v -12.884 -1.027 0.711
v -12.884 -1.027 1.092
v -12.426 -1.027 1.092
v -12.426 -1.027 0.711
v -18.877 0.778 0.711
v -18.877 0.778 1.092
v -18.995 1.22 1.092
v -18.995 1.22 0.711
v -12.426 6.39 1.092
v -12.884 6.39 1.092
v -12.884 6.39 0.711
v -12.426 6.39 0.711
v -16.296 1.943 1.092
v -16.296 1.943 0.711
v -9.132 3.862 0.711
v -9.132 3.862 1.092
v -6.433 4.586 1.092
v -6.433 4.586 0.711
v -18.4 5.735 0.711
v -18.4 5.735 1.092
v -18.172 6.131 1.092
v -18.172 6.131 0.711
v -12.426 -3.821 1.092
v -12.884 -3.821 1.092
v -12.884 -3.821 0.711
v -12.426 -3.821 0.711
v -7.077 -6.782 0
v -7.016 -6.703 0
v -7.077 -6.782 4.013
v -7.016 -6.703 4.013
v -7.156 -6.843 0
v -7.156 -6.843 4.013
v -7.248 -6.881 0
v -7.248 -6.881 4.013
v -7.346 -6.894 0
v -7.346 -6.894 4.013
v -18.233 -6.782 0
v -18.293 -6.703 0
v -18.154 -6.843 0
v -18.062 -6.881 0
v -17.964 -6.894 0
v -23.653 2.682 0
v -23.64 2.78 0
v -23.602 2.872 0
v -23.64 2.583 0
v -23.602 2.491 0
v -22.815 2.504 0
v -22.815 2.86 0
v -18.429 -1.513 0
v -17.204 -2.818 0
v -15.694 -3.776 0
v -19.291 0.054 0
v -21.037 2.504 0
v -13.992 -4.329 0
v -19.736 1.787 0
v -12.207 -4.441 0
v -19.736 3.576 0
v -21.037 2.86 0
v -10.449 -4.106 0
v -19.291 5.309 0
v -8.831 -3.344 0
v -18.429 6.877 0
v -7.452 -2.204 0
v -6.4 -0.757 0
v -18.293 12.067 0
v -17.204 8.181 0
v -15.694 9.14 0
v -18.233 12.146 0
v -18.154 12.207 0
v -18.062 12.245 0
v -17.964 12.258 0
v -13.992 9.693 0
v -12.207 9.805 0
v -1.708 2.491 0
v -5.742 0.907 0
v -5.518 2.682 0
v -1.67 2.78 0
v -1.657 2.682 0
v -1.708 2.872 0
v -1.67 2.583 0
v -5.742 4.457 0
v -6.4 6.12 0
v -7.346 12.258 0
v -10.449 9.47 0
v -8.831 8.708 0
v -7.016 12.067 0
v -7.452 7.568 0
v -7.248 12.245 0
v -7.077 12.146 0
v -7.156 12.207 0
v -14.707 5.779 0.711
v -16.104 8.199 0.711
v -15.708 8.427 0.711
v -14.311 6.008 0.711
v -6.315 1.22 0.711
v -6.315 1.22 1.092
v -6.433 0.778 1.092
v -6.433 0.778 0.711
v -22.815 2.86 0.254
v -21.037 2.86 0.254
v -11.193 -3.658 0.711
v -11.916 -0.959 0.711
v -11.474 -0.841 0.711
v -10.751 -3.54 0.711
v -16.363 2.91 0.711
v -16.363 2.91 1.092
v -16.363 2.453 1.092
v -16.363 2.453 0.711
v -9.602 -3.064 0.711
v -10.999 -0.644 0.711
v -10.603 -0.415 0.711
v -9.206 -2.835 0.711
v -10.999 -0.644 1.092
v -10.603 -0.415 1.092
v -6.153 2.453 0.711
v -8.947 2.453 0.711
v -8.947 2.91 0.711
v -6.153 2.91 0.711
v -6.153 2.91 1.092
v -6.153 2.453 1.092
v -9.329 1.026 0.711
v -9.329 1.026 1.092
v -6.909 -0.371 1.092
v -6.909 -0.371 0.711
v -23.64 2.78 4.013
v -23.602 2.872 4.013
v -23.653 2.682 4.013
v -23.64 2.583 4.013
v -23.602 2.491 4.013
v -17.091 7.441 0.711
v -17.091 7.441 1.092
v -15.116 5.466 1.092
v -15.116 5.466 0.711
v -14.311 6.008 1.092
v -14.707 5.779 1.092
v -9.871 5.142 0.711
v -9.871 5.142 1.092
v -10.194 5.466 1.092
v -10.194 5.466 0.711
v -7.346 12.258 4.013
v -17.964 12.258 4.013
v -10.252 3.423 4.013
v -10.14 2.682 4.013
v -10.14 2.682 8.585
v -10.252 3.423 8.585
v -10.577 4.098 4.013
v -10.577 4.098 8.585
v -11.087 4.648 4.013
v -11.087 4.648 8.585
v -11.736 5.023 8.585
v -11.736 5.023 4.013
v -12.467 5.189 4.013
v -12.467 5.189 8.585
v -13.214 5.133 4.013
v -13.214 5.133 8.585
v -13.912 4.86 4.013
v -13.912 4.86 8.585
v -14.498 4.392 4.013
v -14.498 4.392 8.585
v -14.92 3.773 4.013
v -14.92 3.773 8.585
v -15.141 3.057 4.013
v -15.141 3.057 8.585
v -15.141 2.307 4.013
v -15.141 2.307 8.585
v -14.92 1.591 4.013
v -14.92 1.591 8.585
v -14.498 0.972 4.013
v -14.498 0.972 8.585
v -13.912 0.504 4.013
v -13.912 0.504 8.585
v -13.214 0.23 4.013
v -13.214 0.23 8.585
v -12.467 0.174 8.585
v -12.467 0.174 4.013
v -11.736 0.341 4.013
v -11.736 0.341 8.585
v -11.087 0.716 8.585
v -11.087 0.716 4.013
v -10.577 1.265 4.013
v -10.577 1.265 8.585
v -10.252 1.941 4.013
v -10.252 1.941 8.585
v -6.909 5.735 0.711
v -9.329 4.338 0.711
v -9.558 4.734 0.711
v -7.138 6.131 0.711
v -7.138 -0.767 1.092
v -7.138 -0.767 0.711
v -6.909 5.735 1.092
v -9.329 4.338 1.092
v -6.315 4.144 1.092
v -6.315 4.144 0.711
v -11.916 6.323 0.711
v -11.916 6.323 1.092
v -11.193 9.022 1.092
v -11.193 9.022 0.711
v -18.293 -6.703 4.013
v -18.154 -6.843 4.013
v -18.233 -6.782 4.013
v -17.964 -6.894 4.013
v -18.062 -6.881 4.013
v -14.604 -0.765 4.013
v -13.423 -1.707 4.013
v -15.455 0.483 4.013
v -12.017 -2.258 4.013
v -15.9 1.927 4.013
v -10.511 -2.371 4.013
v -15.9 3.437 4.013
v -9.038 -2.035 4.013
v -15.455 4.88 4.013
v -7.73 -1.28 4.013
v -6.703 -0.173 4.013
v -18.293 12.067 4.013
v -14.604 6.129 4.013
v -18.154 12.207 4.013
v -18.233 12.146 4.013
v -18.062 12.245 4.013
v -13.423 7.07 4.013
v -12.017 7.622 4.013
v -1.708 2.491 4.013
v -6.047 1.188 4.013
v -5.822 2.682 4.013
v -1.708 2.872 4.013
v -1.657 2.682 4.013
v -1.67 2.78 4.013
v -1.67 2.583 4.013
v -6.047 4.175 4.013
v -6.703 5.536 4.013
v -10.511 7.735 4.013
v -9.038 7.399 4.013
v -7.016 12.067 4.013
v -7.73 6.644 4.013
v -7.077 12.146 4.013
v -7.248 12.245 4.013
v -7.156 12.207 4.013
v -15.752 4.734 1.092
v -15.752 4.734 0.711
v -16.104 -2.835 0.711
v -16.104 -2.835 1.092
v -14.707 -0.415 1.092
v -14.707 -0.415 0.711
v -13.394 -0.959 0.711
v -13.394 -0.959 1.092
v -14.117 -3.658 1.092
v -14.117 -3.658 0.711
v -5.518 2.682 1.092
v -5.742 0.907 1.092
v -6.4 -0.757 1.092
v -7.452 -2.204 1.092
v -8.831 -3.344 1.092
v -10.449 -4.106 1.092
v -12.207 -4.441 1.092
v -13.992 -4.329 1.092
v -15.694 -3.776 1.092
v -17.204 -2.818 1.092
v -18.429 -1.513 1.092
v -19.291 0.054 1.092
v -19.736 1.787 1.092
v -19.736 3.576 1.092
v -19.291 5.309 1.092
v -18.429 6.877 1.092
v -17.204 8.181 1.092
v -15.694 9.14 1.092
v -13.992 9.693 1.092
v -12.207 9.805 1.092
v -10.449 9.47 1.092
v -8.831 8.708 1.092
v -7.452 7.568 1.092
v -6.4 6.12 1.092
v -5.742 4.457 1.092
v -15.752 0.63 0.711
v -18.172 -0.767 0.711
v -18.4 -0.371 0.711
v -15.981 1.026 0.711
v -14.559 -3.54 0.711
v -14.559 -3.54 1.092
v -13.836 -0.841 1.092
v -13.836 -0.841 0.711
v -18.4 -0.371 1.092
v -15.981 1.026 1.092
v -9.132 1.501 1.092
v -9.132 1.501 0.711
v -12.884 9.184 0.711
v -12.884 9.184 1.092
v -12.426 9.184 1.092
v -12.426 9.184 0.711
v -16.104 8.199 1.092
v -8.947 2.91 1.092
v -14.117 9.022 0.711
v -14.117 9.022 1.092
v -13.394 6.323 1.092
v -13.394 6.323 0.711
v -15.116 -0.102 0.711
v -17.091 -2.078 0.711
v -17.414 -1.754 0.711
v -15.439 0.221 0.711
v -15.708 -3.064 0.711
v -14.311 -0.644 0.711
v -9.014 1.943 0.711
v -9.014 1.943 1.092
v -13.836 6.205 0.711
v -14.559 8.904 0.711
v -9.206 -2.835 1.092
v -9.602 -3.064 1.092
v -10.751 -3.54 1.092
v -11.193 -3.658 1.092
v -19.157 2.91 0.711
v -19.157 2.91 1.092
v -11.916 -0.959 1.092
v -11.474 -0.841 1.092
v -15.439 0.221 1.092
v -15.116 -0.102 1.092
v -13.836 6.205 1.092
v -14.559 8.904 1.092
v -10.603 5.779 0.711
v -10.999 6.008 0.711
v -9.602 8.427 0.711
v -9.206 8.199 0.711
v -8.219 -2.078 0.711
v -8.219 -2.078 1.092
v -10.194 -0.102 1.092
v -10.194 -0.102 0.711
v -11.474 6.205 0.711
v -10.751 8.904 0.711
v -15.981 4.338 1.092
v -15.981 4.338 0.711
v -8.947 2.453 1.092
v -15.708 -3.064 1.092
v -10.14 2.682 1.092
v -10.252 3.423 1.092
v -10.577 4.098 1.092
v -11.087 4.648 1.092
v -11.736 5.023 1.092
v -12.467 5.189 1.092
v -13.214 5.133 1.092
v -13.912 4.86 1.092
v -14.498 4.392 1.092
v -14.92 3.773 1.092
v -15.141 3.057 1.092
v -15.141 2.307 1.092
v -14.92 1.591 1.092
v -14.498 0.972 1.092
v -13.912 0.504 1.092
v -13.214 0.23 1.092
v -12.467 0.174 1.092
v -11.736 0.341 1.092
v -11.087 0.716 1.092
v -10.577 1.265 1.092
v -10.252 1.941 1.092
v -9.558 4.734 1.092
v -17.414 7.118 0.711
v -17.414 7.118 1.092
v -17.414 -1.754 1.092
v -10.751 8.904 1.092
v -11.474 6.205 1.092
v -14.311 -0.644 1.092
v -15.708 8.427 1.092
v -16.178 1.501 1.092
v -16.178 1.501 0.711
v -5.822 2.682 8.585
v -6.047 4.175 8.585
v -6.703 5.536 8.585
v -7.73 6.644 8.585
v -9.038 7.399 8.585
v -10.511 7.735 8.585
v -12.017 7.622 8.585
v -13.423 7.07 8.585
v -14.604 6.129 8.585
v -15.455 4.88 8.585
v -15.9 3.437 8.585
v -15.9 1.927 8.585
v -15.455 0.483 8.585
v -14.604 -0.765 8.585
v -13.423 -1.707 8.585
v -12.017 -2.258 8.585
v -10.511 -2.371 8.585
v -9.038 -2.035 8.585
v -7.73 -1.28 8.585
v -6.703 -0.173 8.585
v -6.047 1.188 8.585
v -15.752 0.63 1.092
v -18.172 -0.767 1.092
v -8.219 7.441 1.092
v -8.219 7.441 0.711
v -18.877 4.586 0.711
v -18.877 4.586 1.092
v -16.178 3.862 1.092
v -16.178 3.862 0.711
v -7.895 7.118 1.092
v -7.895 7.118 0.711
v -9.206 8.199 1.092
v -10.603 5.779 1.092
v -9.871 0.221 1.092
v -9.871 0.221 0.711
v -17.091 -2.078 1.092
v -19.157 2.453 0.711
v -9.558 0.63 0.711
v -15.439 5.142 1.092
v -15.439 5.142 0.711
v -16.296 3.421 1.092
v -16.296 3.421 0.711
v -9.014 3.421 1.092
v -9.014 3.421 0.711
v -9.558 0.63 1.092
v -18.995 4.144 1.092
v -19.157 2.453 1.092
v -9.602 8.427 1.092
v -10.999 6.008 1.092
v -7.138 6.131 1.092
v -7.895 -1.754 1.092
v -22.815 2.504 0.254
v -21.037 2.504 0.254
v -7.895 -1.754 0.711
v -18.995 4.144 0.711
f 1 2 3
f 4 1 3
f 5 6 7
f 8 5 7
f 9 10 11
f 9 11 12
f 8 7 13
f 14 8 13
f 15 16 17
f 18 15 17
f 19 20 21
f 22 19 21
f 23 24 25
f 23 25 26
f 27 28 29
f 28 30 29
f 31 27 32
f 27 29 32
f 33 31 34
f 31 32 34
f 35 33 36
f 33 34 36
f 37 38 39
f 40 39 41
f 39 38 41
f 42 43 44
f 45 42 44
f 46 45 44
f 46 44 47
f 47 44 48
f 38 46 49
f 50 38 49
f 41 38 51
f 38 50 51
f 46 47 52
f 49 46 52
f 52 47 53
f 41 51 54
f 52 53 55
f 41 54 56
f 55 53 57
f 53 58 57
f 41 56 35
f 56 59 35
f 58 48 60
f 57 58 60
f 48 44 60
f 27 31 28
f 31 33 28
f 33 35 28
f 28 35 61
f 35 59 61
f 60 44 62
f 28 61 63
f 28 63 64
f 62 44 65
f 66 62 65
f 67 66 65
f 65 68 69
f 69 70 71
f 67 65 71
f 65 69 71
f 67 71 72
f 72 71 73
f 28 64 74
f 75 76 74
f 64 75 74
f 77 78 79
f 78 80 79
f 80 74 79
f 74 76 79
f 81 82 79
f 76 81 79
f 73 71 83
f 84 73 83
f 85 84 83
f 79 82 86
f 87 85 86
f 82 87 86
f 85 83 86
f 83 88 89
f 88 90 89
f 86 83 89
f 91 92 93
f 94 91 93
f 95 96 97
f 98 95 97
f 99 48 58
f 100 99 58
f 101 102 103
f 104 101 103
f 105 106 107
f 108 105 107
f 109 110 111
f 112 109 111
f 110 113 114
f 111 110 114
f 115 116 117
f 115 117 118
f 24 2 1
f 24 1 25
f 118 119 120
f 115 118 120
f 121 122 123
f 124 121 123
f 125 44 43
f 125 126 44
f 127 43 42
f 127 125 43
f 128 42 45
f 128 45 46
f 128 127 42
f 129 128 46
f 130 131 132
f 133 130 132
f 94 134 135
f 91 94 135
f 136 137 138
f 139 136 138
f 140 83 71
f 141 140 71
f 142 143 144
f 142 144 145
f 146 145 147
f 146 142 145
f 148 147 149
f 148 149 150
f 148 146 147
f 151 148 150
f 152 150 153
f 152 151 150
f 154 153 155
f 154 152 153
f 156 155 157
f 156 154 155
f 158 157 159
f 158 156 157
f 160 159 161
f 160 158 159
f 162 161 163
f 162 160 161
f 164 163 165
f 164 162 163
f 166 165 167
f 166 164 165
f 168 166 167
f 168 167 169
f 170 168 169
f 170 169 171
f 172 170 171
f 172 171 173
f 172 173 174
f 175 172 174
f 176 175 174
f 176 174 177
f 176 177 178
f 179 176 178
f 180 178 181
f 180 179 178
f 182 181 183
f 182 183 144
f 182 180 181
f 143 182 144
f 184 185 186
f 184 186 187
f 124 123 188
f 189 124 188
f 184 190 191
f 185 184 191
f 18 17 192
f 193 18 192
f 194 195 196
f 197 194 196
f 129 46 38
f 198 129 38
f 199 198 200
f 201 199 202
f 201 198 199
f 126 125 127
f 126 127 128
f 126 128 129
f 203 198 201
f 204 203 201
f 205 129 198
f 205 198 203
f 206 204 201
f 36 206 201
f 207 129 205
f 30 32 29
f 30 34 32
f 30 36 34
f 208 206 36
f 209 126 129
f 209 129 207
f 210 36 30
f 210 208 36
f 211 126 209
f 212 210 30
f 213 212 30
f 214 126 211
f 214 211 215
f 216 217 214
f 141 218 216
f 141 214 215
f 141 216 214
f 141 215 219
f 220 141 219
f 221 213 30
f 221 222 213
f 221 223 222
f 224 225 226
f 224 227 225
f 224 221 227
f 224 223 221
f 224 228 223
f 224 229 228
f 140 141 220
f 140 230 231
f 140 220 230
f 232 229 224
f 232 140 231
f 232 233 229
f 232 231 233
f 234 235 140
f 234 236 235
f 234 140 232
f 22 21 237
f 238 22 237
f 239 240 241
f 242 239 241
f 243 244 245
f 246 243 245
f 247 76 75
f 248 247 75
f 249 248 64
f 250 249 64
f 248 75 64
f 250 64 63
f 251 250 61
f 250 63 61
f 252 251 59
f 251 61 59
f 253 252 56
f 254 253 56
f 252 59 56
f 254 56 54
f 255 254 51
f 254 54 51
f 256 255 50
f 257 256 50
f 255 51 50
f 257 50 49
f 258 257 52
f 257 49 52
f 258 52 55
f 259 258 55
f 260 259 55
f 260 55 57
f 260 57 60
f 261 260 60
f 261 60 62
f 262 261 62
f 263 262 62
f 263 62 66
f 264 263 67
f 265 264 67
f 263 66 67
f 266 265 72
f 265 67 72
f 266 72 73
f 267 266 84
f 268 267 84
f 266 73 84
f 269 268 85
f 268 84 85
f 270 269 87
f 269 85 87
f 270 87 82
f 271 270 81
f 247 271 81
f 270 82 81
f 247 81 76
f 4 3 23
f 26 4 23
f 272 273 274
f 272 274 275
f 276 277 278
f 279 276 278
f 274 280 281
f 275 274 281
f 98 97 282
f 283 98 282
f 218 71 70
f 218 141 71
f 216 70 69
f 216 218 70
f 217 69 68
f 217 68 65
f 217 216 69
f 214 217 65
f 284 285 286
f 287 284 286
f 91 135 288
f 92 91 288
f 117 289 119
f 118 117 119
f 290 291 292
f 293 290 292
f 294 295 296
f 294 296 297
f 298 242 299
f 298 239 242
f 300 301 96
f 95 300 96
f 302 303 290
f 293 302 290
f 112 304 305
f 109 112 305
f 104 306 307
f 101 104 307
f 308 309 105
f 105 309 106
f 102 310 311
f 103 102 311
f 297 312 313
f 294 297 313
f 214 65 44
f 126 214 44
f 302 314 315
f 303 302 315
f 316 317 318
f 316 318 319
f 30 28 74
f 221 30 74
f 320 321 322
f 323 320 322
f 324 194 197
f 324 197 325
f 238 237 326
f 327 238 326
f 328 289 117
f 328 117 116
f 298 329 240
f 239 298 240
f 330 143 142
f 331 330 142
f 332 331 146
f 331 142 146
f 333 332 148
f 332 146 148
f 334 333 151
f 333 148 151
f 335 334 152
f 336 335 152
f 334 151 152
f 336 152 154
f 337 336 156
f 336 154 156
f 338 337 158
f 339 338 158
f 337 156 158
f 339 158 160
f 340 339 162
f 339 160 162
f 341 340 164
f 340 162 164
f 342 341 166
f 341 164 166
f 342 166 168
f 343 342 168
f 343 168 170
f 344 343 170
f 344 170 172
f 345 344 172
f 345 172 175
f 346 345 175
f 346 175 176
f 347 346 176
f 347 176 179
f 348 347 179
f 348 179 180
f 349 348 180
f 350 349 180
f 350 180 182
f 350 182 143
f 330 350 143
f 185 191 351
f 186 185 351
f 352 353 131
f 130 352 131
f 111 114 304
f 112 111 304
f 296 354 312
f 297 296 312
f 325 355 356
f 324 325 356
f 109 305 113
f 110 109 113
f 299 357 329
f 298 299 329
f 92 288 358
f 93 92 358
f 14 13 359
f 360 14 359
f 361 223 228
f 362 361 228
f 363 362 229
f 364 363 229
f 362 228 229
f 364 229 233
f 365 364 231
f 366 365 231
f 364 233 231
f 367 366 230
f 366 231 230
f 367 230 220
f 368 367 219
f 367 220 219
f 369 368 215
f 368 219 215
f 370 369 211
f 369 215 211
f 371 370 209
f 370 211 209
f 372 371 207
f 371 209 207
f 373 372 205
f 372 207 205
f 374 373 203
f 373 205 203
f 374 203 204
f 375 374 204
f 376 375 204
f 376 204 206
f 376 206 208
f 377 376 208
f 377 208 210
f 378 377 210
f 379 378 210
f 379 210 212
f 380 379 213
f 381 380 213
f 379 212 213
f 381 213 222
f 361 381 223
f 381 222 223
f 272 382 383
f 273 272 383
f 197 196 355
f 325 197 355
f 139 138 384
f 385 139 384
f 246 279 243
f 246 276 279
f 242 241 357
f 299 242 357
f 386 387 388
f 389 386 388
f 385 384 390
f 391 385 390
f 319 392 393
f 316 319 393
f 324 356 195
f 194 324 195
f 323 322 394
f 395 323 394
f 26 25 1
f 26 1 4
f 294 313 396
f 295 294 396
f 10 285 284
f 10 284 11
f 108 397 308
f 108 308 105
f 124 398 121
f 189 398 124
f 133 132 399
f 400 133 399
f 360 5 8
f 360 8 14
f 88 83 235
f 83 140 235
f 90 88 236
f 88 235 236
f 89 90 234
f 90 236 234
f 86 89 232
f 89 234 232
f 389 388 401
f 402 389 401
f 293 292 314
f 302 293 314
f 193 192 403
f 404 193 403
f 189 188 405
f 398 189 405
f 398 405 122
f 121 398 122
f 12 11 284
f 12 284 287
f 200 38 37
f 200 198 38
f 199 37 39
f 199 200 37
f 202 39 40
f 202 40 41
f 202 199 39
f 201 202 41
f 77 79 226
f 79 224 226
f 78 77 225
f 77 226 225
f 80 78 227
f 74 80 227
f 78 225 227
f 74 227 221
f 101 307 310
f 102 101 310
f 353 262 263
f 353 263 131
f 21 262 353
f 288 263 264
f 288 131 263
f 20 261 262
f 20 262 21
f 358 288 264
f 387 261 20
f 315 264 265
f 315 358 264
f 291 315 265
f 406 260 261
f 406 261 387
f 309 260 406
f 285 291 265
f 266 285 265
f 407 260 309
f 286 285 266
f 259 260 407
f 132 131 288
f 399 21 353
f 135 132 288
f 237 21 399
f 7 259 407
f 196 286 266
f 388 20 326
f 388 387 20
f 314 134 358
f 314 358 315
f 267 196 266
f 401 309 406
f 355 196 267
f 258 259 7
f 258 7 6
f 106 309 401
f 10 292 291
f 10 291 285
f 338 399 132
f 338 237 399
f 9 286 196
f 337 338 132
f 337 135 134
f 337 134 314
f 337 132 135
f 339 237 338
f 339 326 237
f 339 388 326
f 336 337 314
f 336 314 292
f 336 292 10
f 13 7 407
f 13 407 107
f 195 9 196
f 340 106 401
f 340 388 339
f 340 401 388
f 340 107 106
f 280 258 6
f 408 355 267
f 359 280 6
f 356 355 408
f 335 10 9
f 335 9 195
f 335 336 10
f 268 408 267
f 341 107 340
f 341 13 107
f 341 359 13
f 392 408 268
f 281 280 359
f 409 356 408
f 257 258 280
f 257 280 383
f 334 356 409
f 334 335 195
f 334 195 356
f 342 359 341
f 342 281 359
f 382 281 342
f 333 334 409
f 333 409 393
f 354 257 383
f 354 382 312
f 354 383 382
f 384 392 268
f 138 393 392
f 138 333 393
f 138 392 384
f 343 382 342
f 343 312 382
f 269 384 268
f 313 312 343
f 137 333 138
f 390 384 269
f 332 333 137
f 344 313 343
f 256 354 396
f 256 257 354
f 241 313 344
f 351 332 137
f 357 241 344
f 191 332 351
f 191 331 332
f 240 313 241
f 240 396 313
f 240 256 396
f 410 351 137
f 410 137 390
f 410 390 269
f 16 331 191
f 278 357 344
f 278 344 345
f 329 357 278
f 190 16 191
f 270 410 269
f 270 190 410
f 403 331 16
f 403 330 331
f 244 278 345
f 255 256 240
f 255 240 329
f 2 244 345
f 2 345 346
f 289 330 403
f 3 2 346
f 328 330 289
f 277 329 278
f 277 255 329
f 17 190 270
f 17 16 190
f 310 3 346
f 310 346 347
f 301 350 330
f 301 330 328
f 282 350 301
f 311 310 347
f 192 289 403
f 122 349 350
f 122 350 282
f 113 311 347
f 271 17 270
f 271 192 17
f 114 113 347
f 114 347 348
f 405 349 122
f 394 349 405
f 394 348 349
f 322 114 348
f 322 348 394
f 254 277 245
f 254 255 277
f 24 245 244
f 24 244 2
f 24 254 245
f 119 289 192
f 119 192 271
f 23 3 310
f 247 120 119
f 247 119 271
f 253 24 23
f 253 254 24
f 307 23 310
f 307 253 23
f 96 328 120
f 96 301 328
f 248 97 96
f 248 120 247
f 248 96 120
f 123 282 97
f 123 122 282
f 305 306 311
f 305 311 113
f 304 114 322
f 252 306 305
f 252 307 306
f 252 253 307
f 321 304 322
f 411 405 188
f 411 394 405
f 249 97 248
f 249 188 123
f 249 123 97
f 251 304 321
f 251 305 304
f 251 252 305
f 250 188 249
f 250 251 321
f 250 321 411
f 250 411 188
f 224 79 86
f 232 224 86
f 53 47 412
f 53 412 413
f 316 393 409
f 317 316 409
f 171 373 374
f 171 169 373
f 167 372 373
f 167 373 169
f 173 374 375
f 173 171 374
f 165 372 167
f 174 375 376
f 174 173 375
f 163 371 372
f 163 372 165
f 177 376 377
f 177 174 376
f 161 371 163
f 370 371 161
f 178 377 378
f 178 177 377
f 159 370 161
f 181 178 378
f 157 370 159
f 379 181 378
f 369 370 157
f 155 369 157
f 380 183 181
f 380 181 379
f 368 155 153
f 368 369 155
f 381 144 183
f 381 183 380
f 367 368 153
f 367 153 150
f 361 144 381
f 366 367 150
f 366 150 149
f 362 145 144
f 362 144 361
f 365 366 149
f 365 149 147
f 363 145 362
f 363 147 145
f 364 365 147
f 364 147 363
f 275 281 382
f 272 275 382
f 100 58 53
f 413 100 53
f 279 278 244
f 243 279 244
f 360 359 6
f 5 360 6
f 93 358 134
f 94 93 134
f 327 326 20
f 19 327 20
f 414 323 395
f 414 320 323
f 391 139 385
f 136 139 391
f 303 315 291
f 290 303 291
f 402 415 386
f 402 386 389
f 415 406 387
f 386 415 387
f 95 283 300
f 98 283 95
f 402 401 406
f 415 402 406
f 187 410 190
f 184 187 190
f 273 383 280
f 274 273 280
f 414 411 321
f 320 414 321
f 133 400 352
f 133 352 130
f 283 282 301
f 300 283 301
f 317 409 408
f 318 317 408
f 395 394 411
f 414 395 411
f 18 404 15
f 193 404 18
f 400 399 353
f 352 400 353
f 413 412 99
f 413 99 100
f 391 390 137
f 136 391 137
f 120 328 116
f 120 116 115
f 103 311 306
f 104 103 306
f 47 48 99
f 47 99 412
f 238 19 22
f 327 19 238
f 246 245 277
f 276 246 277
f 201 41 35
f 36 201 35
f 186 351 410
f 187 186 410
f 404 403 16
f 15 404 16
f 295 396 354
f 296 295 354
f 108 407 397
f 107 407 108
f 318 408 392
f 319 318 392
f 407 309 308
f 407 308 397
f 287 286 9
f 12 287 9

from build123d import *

# Parameters (mm, degrees)
F1_DEPTH  = 4.0132
F2_R      = 2.5146
F3_DEPTH  = 25.4
F4_R      = 5.0673
F4_R_2    = 2.5146
F5_DEPTH  = 4.572
F6_R      = 7.1374
F7_DEPTH  = 1.0922
F8_W      = 2.794
F8_H      = 0.4572
F8_W_2    = 0.4572
F8_H_2    = 2.794
F9_DEPTH  = 0.381
F10_R     = 0.381
F11_W     = 1.778
F11_H     = 0.3556
F12_DEPTH = 0.254


with BuildPart() as f1:
    # F0 (on Top) → F1 (new body)
    with BuildSketch(Plane.XY):
        Polygon((-7.126325, 12.257675), (-18.183506, 12.257675), (-23.712097, 2.681875), (-18.183506, -6.893925), (-7.126325, -6.893925), (-1.597734, 2.681875), align=None)
    extrude(amount=F1_DEPTH)

    # F2 (on face) → F3 (cut)
    with BuildSketch(Plane.XY.offset(4.0132)):
        with Locations((-12.654915, 2.681875)):
            Circle(F2_R)
    extrude(amount=-F3_DEPTH, mode=Mode.SUBTRACT)

    # F4 (on face) → F5 (join)
    with BuildSketch(Plane.XY.offset(4.0132)):
        with Locations((-10.889615, 2.681875)):
            Circle(F4_R)
        with Locations((-12.654915, 2.681875)):
            Circle(F4_R_2, mode=Mode.SUBTRACT)
    extrude(amount=F5_DEPTH)

    # F6 (on face) → F7 (cut)
    with BuildSketch(Plane(origin=(0, 0, 0), x_dir=(1, 0, 0), z_dir=(0, 0, -1))):
        with Locations((-12.654915, -2.681875)):
            Circle(F6_R)
    extrude(amount=-F7_DEPTH, mode=Mode.SUBTRACT)

    # F8 (on face) → F9 (join)
    with BuildSketch(Plane(origin=(0, 0, 1.0922), x_dir=(1, 0, 0), z_dir=(0, 0, -1))):
        with Locations((-7.549515, -2.681875)):
            Rectangle(F8_W, F8_H)
        Polygon((-9.132042, -1.50126), (-9.01371, -1.942881), (-6.314913, -1.21974), (-6.433245, -0.778119), align=None)
        Polygon((-9.557647, -0.629701), (-9.329047, -1.025648), (-6.909372, 0.371352), (-7.137972, 0.767299), align=None)
        Polygon((-10.194325, 0.102005), (-9.871036, -0.221285), (-7.89538, 1.754372), (-8.218669, 2.077661), align=None)
        Polygon((-10.998689, 0.643994), (-10.602742, 0.415394), (-9.205742, 2.835069), (-9.601689, 3.063669), align=None)
        Polygon((-11.915922, 0.959331), (-11.4743, 0.840999), (-10.75116, 3.539795), (-11.192781, 3.658127), align=None)
        with Locations((-12.654915, 2.423525)):
            Rectangle(F8_W_2, F8_H_2)
        Polygon((-13.835531, 0.840999), (-13.393909, 0.959331), (-14.11705, 3.658127), (-14.558671, 3.539795), align=None)
        Polygon((-14.707089, 0.415394), (-14.311142, 0.643994), (-15.708142, 3.063669), (-16.104089, 2.835069), align=None)
        Polygon((-15.438795, -0.221285), (-15.115506, 0.102005), (-17.091162, 2.077661), (-17.414451, 1.754372), align=None)
        Polygon((-15.980784, -1.025648), (-15.752184, -0.629701), (-18.171859, 0.767299), (-18.400459, 0.371352), align=None)
        Polygon((-16.296121, -1.942881), (-16.177789, -1.50126), (-18.876586, -0.778119), (-18.994918, -1.21974), align=None)
        with Locations((-17.760315, -2.681875)):
            Rectangle(F8_W, F8_H)
        Polygon((-16.177789, -3.86249), (-16.296121, -3.420869), (-18.994918, -4.144009), (-18.876586, -4.58563), align=None)
        Polygon((-15.752184, -4.734048), (-15.980784, -4.338101), (-18.400459, -5.735101), (-18.171859, -6.131048), align=None)
        Polygon((-15.115506, -5.465754), (-15.438795, -5.142465), (-17.414451, -7.118121), (-17.091162, -7.44141), align=None)
        Polygon((-14.311142, -6.007743), (-14.707089, -5.779143), (-16.104089, -8.198818), (-15.708142, -8.427418), align=None)
        Polygon((-13.393909, -6.32308), (-13.835531, -6.204748), (-14.558671, -8.903545), (-14.11705, -9.021877), align=None)
        with Locations((-12.654915, -7.787275)):
            Rectangle(F8_W_2, F8_H_2)
        Polygon((-11.4743, -6.204748), (-11.915922, -6.32308), (-11.192781, -9.021877), (-10.75116, -8.903545), align=None)
        Polygon((-10.602742, -5.779143), (-10.998689, -6.007743), (-9.601689, -8.427418), (-9.205742, -8.198818), align=None)
        Polygon((-9.871036, -5.142465), (-10.194325, -5.465754), (-8.218669, -7.44141), (-7.89538, -7.118121), align=None)
        Polygon((-9.329047, -4.338101), (-9.557647, -4.734048), (-7.137972, -6.131048), (-6.909372, -5.735101), align=None)
        Polygon((-9.01371, -3.420869), (-9.132042, -3.86249), (-6.433245, -4.58563), (-6.314913, -4.144009), align=None)
    extrude(amount=F9_DEPTH)

    # F10
    f10_edges = [f1.edges().sort_by_distance(p)[0] for p in [
        (-7.126325, 12.257675, 2.0066),
        (-18.183506, 12.257675, 2.0066),
        (-23.712097, 2.681875, 2.0066),
        (-18.183506, -6.893925, 2.0066),
        (-7.126325, -6.893925, 2.0066),
        (-1.597734, 2.681875, 2.0066),
    ]]
    fillet(f10_edges, radius=F10_R)

    # F11 (on face) → F12 (cut)
    with BuildSketch(Plane(origin=(0, 0, 0), x_dir=(1, 0, 0), z_dir=(0, 0, -1))):
        with Locations((-21.925915, -2.681875)):
            Rectangle(F11_W, F11_H)
    extrude(amount=-F12_DEPTH, mode=Mode.SUBTRACT)


solid = f1.part
